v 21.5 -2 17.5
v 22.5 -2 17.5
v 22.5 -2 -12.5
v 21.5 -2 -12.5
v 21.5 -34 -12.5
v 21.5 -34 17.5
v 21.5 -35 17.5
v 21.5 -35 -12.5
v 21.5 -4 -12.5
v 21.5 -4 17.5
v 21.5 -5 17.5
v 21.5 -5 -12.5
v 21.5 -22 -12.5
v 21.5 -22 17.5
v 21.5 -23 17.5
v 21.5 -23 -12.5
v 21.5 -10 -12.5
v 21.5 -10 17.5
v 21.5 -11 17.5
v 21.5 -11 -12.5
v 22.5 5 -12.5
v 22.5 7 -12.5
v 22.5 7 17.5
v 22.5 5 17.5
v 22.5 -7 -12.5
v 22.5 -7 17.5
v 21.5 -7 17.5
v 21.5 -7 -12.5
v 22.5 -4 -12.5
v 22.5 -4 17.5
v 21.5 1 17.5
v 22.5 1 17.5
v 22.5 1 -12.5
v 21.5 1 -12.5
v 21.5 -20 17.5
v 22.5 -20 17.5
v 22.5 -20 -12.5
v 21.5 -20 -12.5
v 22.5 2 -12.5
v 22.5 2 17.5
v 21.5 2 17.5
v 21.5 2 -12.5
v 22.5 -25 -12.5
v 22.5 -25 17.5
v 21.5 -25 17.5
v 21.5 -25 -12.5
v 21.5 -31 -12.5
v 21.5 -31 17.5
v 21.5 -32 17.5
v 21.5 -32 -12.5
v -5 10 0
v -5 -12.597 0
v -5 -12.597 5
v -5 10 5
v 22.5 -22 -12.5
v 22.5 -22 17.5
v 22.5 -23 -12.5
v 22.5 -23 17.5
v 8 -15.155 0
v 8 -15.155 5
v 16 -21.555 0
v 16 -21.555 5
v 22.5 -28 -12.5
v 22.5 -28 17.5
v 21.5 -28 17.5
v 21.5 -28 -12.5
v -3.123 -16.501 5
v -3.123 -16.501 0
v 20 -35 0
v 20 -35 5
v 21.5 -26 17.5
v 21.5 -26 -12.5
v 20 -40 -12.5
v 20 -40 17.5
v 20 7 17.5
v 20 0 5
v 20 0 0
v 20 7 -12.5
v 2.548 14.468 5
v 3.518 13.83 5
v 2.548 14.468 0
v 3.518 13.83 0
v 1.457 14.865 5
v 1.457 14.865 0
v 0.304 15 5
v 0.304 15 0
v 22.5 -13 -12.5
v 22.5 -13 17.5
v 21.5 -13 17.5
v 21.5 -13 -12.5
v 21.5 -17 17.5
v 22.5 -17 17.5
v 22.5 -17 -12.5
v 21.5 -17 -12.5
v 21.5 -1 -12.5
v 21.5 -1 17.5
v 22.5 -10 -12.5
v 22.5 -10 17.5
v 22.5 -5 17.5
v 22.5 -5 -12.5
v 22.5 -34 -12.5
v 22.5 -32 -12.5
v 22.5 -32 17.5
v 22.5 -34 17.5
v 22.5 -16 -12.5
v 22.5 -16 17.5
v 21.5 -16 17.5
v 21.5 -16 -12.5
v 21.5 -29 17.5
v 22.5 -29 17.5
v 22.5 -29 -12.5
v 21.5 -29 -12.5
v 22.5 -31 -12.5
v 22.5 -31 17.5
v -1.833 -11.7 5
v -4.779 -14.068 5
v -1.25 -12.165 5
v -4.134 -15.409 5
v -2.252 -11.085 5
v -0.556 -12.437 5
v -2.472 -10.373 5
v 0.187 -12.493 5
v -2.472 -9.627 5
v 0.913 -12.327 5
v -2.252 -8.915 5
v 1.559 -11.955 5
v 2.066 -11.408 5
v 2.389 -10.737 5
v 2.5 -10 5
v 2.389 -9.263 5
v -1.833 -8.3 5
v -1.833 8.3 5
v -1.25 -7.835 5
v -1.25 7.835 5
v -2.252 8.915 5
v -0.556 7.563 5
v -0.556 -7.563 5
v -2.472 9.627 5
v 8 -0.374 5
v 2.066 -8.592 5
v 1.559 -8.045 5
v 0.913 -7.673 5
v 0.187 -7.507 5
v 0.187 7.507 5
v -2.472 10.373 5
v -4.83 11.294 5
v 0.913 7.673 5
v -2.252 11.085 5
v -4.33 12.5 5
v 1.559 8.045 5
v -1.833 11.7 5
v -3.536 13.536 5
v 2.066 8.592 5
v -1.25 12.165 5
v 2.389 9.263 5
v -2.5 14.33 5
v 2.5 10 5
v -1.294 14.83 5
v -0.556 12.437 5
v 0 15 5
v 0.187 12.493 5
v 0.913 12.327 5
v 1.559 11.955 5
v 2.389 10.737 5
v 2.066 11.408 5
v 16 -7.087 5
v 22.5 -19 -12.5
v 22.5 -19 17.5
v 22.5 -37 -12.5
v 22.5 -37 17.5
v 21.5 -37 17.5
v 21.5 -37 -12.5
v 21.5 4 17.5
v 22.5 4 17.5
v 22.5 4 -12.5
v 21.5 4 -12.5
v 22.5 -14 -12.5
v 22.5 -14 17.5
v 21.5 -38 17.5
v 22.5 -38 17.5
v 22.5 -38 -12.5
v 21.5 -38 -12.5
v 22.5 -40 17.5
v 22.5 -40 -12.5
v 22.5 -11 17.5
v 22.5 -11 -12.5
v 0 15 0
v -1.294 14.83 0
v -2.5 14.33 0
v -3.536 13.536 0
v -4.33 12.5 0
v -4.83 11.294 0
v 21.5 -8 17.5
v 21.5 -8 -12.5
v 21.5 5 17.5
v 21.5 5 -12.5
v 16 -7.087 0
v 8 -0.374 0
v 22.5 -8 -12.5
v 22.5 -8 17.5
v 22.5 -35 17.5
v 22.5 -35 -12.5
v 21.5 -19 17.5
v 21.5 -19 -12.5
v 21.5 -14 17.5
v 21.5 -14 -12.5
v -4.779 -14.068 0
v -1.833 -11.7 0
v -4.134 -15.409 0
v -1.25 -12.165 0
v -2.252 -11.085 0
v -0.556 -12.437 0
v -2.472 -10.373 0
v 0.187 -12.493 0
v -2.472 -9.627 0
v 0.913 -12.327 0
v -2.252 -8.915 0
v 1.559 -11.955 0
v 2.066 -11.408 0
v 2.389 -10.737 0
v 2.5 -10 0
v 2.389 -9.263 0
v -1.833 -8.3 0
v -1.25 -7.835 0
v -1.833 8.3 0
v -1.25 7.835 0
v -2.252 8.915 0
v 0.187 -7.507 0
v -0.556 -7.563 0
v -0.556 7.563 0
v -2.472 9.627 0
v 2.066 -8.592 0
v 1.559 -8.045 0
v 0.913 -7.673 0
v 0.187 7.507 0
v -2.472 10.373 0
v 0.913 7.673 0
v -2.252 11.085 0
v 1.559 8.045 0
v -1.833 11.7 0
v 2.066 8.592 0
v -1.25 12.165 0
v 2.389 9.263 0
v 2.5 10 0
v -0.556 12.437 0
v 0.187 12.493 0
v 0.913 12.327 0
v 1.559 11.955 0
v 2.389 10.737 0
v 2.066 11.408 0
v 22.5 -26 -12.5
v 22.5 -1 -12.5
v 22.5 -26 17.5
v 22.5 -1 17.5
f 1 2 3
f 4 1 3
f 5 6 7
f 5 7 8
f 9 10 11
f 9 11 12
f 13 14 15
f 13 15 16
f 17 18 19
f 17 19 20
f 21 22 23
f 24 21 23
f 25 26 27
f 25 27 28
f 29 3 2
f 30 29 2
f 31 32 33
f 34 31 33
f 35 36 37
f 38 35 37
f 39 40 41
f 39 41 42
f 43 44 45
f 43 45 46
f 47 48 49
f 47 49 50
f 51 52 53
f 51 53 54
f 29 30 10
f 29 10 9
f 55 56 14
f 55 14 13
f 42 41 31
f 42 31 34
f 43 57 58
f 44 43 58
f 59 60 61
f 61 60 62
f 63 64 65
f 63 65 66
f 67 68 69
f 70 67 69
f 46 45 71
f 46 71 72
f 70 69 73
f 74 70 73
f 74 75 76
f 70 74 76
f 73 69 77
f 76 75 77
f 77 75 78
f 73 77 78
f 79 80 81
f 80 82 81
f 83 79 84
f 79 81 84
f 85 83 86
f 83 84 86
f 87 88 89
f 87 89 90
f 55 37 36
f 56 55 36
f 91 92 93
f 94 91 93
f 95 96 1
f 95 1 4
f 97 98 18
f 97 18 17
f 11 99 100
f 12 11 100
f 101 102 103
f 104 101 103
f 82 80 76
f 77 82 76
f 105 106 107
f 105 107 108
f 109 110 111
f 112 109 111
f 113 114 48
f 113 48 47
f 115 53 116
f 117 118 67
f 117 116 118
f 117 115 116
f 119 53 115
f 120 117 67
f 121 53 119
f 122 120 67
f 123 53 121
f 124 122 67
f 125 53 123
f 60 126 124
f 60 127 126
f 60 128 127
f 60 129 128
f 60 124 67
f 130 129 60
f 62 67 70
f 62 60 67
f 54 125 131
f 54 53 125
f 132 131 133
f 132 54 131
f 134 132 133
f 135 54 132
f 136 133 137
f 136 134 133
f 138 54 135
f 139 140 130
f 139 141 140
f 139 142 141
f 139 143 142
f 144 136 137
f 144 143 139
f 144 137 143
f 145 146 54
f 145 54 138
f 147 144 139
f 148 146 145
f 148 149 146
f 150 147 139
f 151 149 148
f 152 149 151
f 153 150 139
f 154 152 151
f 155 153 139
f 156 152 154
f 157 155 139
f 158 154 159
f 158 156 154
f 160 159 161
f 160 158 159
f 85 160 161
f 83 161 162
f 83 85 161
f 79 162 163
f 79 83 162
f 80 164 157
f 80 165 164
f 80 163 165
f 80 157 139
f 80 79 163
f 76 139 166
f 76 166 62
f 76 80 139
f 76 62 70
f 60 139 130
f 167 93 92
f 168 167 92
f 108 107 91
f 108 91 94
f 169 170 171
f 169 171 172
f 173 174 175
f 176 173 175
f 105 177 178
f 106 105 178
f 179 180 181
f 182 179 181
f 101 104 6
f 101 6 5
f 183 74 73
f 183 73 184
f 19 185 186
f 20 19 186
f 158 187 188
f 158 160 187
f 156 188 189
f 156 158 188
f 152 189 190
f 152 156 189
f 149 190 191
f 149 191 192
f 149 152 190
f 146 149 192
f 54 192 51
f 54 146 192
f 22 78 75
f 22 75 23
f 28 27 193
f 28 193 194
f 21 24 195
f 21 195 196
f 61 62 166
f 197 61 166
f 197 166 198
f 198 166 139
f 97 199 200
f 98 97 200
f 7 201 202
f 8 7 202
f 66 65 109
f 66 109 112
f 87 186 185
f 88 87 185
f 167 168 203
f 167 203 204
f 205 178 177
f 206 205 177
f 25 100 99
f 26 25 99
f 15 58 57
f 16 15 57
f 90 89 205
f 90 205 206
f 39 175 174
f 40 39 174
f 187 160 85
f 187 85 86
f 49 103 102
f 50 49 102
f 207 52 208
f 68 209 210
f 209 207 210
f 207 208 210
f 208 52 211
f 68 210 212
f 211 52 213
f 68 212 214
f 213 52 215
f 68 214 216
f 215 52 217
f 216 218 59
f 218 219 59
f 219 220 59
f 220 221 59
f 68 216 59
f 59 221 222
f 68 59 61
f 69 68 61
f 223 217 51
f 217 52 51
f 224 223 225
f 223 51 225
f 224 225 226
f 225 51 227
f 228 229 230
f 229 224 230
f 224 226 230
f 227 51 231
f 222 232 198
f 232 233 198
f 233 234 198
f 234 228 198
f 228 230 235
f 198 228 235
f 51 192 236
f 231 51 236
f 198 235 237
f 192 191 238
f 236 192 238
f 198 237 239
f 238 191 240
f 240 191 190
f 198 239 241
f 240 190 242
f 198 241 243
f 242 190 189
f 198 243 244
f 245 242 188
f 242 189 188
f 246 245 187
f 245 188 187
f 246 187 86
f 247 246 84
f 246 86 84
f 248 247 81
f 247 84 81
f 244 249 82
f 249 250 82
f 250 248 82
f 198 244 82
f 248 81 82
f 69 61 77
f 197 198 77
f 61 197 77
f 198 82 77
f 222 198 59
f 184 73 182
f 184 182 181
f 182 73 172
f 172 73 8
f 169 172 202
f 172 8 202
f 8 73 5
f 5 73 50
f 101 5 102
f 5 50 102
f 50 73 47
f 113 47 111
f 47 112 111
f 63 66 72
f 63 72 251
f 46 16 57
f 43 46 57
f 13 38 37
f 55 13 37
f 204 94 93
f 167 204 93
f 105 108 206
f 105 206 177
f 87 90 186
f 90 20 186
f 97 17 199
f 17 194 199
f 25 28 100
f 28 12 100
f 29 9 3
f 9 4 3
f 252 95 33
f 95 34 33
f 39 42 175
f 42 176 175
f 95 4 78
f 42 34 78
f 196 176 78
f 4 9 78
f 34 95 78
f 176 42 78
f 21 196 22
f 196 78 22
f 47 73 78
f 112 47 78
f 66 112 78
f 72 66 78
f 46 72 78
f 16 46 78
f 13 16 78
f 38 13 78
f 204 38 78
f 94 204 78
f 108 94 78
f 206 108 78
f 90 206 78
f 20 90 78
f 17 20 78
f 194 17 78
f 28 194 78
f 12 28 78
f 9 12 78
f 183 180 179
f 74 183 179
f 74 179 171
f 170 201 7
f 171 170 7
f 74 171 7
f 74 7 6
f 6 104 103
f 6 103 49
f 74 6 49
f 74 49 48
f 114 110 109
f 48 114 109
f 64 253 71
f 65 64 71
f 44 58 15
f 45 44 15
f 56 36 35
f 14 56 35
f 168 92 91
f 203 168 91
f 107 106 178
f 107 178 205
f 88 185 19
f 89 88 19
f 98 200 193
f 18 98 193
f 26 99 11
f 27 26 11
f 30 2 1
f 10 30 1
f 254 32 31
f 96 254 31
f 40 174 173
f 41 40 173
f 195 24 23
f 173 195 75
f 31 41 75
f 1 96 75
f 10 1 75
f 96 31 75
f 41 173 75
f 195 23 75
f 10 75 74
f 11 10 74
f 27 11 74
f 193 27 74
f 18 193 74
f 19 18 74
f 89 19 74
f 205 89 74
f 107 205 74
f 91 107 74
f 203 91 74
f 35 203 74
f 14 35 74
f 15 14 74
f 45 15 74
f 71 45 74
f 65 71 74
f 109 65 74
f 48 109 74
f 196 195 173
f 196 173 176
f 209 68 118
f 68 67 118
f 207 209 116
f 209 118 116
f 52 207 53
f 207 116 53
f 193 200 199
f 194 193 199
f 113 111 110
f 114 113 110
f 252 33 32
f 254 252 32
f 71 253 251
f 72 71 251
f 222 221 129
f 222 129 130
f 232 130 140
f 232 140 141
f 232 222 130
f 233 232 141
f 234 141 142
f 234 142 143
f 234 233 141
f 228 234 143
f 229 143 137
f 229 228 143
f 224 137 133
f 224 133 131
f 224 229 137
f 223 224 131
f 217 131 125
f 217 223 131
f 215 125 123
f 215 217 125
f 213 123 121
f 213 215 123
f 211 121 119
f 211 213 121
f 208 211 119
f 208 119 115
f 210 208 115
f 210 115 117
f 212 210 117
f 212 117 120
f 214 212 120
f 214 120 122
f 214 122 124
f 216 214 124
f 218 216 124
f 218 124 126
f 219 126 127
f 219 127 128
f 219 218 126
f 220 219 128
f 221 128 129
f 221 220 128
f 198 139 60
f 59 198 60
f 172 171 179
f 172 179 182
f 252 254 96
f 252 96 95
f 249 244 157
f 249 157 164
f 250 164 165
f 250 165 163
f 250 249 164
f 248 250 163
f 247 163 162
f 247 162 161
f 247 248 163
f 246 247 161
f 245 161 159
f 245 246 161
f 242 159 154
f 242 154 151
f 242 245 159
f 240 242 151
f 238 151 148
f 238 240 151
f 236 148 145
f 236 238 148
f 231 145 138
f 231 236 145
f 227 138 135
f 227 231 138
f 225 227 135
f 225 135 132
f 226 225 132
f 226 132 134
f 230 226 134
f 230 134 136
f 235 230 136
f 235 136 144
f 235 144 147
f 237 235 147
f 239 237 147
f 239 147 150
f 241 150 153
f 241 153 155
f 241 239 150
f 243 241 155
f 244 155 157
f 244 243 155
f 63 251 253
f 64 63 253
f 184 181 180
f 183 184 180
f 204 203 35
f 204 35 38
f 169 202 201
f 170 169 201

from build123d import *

# Parameters (mm, degrees)
SKETCH2_W           = 10
SKETCH2_H           = 30
SKETCH2_R           = 2.5
BOSS_EXTRUDE1_DEPTH = 5
SKETCH3_W           = 30
SKETCH3_H           = 30
BOSS_EXTRUDE2_DEPTH = 2
SKETCH4_W           = 2
SKETCH4_H           = 30
BOSS_EXTRUDE3_DEPTH = 20
SKETCH5_W           = 30
SKETCH5_H           = 50
BOSS_EXTRUDE4_DEPTH = 18.5
CUT_EXTRUDE1_DEPTH  = 15
BOSS_EXTRUDE5_DEPTH = 5
SKETCH9_W           = 30
SKETCH9_H           = 50
CUT_EXTRUDE2_DEPTH  = 3
CUT_EXTRUDE3_DEPTH  = 10
FILLET1_R           = 5
SKETCH13_W          = 2.5
SKETCH13_H          = 30
CUT_EXTRUDE4_DEPTH  = 8
BOSS_EXTRUDE9_DEPTH = 5
SKETCH15_W          = 30
SKETCH15_H          = 1
CUT_EXTRUDE5_DEPTH  = 1
CUT_EXTRUDE6_DEPTH  = 50.117206761


with BuildPart() as part:
    # Sketch2 → Boss-Extrude1 (new body)
    with BuildSketch(Plane.XY):
        Rectangle(SKETCH2_W, SKETCH2_H)
        with Locations((0, 10)):
            Circle(SKETCH2_R, mode=Mode.SUBTRACT)
        with Locations((0, -10)):
            Circle(SKETCH2_R, mode=Mode.SUBTRACT)
    extrude(amount=BOSS_EXTRUDE1_DEPTH)

    # Sketch3 → Boss-Extrude2 (add)
    with BuildSketch(Plane(origin=(5, 0, 0), x_dir=(0, 0, -1), z_dir=(1, 0, 0))):
        with Locations((-2.5, 0)):
            Rectangle(SKETCH3_W, SKETCH3_H)
    extrude(amount=BOSS_EXTRUDE2_DEPTH)

    # Sketch4 → Boss-Extrude3 (add)
    with BuildSketch(Plane.XZ.offset(15)):
        with Locations((6, 2.5)):
            Rectangle(SKETCH4_W, SKETCH4_H)
    extrude(amount=BOSS_EXTRUDE3_DEPTH)

    # Sketch5 → Boss-Extrude4 (add)
    with BuildSketch(Plane(origin=(7, 0, 0), x_dir=(0, 0, -1), z_dir=(1, 0, 0))):
        with Locations((-2.5, -10)):
            Rectangle(SKETCH5_W, SKETCH5_H)
    extrude(amount=BOSS_EXTRUDE4_DEPTH)

    # Sketch6 → Cut-Extrude1 (cut)
    with BuildSketch(Plane.ZY.offset(-5)):
        Polygon((-12.5, 15), (-12.5, -35), (17.5, -35), (17.5, 15), (5, 15), (5, -15), (0, -15), (0, 15), align=None)
    extrude(amount=-CUT_EXTRUDE1_DEPTH, mode=Mode.SUBTRACT)

    # Sketch7 → Boss-Extrude5 (add)
    with BuildSketch(Plane.XY):
        Polygon((-5, -15), (20, -35), (20, -15), align=None)
    extrude(amount=BOSS_EXTRUDE5_DEPTH)

    # Sketch9 → Cut-Extrude2 (cut)
    with BuildSketch(Plane(origin=(25.5, 0, 0), x_dir=(0, 0, -1), z_dir=(1, 0, 0))):
        with Locations((-2.5, -10)):
            Rectangle(SKETCH9_W, SKETCH9_H)
    extrude(amount=-CUT_EXTRUDE2_DEPTH, mode=Mode.SUBTRACT)

    # Sketch12 → Cut-Extrude3 (cut)
    with BuildSketch(Plane.XY.offset(5)):
        Polygon((2.123696111, 15), (20, 0), (20, 15), align=None)
    extrude(amount=-CUT_EXTRUDE3_DEPTH, mode=Mode.SUBTRACT)

    # Fillet1
    fillet1_edges = [part.edges().sort_by_distance(p)[0] for p in [
        (2.123696111, 15, 2.5),
        (-5, -15, 2.5),
        (-5, 15, 2.5),
    ]]
    fillet(fillet1_edges, radius=FILLET1_R)

    # Sketch13 → Cut-Extrude4 (cut)
    with BuildSketch(Plane(origin=(0, 15, 0), x_dir=(1, 0, 0), z_dir=(0, 1, 0))):
        with Locations((21.25, -2.5)):
            Rectangle(SKETCH13_W, SKETCH13_H)
    extrude(amount=-CUT_EXTRUDE4_DEPTH, mode=Mode.SUBTRACT)

    # Sketch14 → Boss-Extrude9 (add)
    with BuildSketch(Plane.XZ.offset(35)):
        Polygon((22.5, -12.5), (22.5, 17.5), (20, 17.5), (20, 5), (20, 0), (20, -12.5), align=None)
    extrude(amount=BOSS_EXTRUDE9_DEPTH)

    # Sketch15 → Cut-Extrude5 (cut)
    with BuildSketch(Plane(origin=(22.5, 0, 0), x_dir=(0, 0, -1), z_dir=(1, 0, 0))):
        with Locations((-2.5, 4.5)):
            Rectangle(SKETCH15_W, SKETCH15_H)
        with Locations((-2.5, 1.5)):
            Rectangle(SKETCH15_W, SKETCH15_H)
        with Locations((-2.5, -1.5)):
            Rectangle(SKETCH15_W, SKETCH15_H)
        with Locations((-2.5, -4.5)):
            Rectangle(SKETCH15_W, SKETCH15_H)
        with Locations((-2.5, -7.5)):
            Rectangle(SKETCH15_W, SKETCH15_H)
        with Locations((-2.5, -10.5)):
            Rectangle(SKETCH15_W, SKETCH15_H)
        with Locations((-2.5, -13.5)):
            Rectangle(SKETCH15_W, SKETCH15_H)
        with Locations((-2.5, -16.5)):
            Rectangle(SKETCH15_W, SKETCH15_H)
        with Locations((-2.5, -19.5)):
            Rectangle(SKETCH15_W, SKETCH15_H)
        with Locations((-2.5, -22.5)):
            Rectangle(SKETCH15_W, SKETCH15_H)
        with Locations((-2.5, -25.5)):
            Rectangle(SKETCH15_W, SKETCH15_H)
        with Locations((-2.5, -28.5)):
            Rectangle(SKETCH15_W, SKETCH15_H)
        with Locations((-2.5, -31.5)):
            Rectangle(SKETCH15_W, SKETCH15_H)
        with Locations((-2.5, -34.5)):
            Rectangle(SKETCH15_W, SKETCH15_H)
        with Locations((-2.5, -37.5)):
            Rectangle(SKETCH15_W, SKETCH15_H)
    extrude(amount=-CUT_EXTRUDE5_DEPTH, mode=Mode.SUBTRACT)

    # Sketch17 → Cut-Extrude6 (cut, through all)
    with BuildSketch(Plane.XY.offset(5)):
        Polygon((8, -0.374062741), (8, -15.15500122), (16, -21.55500122), (16, -7.08685979), align=None)
    extrude(amount=-CUT_EXTRUDE6_DEPTH, mode=Mode.SUBTRACT)


solid = part.part
